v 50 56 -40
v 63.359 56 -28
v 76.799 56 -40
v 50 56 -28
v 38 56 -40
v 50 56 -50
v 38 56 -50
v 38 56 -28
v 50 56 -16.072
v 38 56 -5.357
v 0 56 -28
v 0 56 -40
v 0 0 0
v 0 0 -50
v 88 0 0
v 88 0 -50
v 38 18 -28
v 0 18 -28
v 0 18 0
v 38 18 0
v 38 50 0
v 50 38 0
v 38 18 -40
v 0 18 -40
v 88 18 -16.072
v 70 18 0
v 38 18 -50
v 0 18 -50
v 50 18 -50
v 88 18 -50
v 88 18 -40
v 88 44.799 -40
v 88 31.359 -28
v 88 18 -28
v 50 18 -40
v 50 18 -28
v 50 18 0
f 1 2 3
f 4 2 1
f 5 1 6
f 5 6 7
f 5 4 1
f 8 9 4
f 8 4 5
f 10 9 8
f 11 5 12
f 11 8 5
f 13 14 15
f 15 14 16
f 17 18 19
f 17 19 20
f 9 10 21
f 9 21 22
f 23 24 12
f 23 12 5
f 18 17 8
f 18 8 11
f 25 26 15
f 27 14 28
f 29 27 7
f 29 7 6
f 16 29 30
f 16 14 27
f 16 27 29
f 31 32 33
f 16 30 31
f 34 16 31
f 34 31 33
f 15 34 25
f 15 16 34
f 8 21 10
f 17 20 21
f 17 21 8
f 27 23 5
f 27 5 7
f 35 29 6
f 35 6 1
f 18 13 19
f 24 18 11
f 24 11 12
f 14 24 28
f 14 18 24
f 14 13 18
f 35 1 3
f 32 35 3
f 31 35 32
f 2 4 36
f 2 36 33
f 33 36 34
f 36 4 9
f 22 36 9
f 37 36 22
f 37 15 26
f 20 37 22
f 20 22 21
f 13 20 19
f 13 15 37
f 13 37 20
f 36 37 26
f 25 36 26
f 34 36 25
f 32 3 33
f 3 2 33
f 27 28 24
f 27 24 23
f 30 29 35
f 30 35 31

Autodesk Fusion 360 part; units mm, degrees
sketch "Sketch1" plane through (0, 0, 0) normal (0, 1, 0) x (1, 0, 0)
  line L0 (0, 0) -> (0, 50)
  line L1 (0, 50) -> (88, 50)
  line L2 (88, 50) -> (88, 0)
  line L3 (88, 0) -> (0, 0)
  dimension "d1" = 50
  dimension "d2" = 88
extrude "Extrude1" add sketch "Sketch1" along normal blind 18
sketch "Sketch2" plane through (0, 18, 0) normal (0, 1, 0) x (-1, 0, 0)
  line L0 (-88, 0) -> (-88, -50)
  line L1 (-88, -50) -> (0, -50)
  line L2 (0, -50) -> (0, 0)
  line L3 (0, 0) -> (-88, 0)
  line L4 (-38, 0) -> (-38, -28)
  line L5 (-38, -28) -> (0, -28)
  line L6 (0, -28) -> (0, -40)
  line L7 (0, -40) -> (-38, -40)
  line L8 (-38, -40) -> (-38, -50)
  line L9 (-38, -50) -> (-50, -50)
  line L10 (-50, -50) -> (-50, -40)
  line L11 (-50, -40) -> (-88, -40)
  line L12 (-88, -40) -> (-88, -28)
  line L13 (-50, -28) -> (-50, 0)
  line L14 (-38, 0) -> (-50, 0)
  line L15 (-50, -28) -> (-88, -28)
  line L16 (-50, 0) -> (-38, 0)
extrude "Extrude2" add sketch "Sketch2" along normal blind 38 contours L0 L1 L2 L3 L4 L5 L6 L7 L8 L9 L10 L11 L12 L13 L14 L15 L16
sketch "Sketch3" plane through (0, 0, 0) normal (0, 0, 1) x (1, 0, 0)
sketch "Sketch4" plane through (0, 0, 0) normal (0, 0, 1) x (1, 0, 0)
  line L0 (0, 0) -> (88, 0)
  line L1 (88, 0) -> (88, 18)
  line L2 (88, 18) -> (50, 18)
  line L3 (50, 18) -> (50, 56)
  line L4 (50, 56) -> (38, 56)
  line L5 (38, 56) -> (38, 18)
  line L6 (38, 18) -> (0, 18)
  line L7 (0, 18) -> (0, 0)
  line L8 (88, 0) -> (-2.3828, 0) construction
sketch "Sketch5" plane through (88, 0, 0) normal (1, 0, 0) x (0, 0, -1)
  line L0 (0, 0) -> (50, 0)
  line L1 (50, 0) -> (50, 18)
  line L2 (50, 18) -> (40, 18)
  line L3 (40, 18) -> (40, 56)
  line L4 (40, 56) -> (28, 56)
  line L5 (28, 56) -> (28, 18)
  line L6 (28, 18) -> (0, 18)
  line L7 (0, 18) -> (0, 0)
sketch "Sketch6" plane through (0, 0, 0) normal (0, 0, 1) x (1, 0, 0)
sketch "Sketch7" plane through (0, 0, 0) normal (0, 0, 1) x (1, 0, 0)
sketch "Sketch9" plane through (0, 0, 0) normal (0, 0, 1) x (1, 0, 0)
sketch "Sketch10" plane through (0, 56, 0) normal (0, 1, 0) x (-1, 0, 0)
  line L0 (-50, -28) -> (-88, -28)
  line L1 (-88, -28) -> (-88, -40)
  line L2 (-88, -40) -> (-50, -40)
  line L3 (-50, -40) -> (-50, -50)
  line L4 (-50, -50) -> (-38, -50)
  line L5 (-38, -50) -> (-38, -40)
  line L6 (-38, -40) -> (0, -40)
  line L7 (0, -40) -> (0, -28)
  line L8 (0, -28) -> (-38, -28)
  line L9 (-38, -28) -> (-38, 0)
  line L10 (-38, 0) -> (-50, 0)
  line L11 (-50, 0) -> (-50, -28)
sketch "Sketch11" plane through (0, 0, 0) normal (0, 0, 1) x (1, 0, 0)
ref_plane "WorkPlane1" through (88, 0, 0) normal (-0.5543, -0.5543, -0.6208) x (0.7071, -0.7071, 0)
sketch "Sketch12" plane through (88, 0, 0) normal (-0.5543, -0.5543, -0.6208) x (0.7071, -0.7071, 0)
  line L0 (-83.6898, 2.465) -> (-36.8291, -71.3922)
  line L1 (-36.8291, -71.3922) -> (9.1129, 2.465)
  line L2 (9.1129, 2.465) -> (-83.6898, 2.465)
extrude "Extrude3" cut sketch "Sketch12" against normal blind 15
